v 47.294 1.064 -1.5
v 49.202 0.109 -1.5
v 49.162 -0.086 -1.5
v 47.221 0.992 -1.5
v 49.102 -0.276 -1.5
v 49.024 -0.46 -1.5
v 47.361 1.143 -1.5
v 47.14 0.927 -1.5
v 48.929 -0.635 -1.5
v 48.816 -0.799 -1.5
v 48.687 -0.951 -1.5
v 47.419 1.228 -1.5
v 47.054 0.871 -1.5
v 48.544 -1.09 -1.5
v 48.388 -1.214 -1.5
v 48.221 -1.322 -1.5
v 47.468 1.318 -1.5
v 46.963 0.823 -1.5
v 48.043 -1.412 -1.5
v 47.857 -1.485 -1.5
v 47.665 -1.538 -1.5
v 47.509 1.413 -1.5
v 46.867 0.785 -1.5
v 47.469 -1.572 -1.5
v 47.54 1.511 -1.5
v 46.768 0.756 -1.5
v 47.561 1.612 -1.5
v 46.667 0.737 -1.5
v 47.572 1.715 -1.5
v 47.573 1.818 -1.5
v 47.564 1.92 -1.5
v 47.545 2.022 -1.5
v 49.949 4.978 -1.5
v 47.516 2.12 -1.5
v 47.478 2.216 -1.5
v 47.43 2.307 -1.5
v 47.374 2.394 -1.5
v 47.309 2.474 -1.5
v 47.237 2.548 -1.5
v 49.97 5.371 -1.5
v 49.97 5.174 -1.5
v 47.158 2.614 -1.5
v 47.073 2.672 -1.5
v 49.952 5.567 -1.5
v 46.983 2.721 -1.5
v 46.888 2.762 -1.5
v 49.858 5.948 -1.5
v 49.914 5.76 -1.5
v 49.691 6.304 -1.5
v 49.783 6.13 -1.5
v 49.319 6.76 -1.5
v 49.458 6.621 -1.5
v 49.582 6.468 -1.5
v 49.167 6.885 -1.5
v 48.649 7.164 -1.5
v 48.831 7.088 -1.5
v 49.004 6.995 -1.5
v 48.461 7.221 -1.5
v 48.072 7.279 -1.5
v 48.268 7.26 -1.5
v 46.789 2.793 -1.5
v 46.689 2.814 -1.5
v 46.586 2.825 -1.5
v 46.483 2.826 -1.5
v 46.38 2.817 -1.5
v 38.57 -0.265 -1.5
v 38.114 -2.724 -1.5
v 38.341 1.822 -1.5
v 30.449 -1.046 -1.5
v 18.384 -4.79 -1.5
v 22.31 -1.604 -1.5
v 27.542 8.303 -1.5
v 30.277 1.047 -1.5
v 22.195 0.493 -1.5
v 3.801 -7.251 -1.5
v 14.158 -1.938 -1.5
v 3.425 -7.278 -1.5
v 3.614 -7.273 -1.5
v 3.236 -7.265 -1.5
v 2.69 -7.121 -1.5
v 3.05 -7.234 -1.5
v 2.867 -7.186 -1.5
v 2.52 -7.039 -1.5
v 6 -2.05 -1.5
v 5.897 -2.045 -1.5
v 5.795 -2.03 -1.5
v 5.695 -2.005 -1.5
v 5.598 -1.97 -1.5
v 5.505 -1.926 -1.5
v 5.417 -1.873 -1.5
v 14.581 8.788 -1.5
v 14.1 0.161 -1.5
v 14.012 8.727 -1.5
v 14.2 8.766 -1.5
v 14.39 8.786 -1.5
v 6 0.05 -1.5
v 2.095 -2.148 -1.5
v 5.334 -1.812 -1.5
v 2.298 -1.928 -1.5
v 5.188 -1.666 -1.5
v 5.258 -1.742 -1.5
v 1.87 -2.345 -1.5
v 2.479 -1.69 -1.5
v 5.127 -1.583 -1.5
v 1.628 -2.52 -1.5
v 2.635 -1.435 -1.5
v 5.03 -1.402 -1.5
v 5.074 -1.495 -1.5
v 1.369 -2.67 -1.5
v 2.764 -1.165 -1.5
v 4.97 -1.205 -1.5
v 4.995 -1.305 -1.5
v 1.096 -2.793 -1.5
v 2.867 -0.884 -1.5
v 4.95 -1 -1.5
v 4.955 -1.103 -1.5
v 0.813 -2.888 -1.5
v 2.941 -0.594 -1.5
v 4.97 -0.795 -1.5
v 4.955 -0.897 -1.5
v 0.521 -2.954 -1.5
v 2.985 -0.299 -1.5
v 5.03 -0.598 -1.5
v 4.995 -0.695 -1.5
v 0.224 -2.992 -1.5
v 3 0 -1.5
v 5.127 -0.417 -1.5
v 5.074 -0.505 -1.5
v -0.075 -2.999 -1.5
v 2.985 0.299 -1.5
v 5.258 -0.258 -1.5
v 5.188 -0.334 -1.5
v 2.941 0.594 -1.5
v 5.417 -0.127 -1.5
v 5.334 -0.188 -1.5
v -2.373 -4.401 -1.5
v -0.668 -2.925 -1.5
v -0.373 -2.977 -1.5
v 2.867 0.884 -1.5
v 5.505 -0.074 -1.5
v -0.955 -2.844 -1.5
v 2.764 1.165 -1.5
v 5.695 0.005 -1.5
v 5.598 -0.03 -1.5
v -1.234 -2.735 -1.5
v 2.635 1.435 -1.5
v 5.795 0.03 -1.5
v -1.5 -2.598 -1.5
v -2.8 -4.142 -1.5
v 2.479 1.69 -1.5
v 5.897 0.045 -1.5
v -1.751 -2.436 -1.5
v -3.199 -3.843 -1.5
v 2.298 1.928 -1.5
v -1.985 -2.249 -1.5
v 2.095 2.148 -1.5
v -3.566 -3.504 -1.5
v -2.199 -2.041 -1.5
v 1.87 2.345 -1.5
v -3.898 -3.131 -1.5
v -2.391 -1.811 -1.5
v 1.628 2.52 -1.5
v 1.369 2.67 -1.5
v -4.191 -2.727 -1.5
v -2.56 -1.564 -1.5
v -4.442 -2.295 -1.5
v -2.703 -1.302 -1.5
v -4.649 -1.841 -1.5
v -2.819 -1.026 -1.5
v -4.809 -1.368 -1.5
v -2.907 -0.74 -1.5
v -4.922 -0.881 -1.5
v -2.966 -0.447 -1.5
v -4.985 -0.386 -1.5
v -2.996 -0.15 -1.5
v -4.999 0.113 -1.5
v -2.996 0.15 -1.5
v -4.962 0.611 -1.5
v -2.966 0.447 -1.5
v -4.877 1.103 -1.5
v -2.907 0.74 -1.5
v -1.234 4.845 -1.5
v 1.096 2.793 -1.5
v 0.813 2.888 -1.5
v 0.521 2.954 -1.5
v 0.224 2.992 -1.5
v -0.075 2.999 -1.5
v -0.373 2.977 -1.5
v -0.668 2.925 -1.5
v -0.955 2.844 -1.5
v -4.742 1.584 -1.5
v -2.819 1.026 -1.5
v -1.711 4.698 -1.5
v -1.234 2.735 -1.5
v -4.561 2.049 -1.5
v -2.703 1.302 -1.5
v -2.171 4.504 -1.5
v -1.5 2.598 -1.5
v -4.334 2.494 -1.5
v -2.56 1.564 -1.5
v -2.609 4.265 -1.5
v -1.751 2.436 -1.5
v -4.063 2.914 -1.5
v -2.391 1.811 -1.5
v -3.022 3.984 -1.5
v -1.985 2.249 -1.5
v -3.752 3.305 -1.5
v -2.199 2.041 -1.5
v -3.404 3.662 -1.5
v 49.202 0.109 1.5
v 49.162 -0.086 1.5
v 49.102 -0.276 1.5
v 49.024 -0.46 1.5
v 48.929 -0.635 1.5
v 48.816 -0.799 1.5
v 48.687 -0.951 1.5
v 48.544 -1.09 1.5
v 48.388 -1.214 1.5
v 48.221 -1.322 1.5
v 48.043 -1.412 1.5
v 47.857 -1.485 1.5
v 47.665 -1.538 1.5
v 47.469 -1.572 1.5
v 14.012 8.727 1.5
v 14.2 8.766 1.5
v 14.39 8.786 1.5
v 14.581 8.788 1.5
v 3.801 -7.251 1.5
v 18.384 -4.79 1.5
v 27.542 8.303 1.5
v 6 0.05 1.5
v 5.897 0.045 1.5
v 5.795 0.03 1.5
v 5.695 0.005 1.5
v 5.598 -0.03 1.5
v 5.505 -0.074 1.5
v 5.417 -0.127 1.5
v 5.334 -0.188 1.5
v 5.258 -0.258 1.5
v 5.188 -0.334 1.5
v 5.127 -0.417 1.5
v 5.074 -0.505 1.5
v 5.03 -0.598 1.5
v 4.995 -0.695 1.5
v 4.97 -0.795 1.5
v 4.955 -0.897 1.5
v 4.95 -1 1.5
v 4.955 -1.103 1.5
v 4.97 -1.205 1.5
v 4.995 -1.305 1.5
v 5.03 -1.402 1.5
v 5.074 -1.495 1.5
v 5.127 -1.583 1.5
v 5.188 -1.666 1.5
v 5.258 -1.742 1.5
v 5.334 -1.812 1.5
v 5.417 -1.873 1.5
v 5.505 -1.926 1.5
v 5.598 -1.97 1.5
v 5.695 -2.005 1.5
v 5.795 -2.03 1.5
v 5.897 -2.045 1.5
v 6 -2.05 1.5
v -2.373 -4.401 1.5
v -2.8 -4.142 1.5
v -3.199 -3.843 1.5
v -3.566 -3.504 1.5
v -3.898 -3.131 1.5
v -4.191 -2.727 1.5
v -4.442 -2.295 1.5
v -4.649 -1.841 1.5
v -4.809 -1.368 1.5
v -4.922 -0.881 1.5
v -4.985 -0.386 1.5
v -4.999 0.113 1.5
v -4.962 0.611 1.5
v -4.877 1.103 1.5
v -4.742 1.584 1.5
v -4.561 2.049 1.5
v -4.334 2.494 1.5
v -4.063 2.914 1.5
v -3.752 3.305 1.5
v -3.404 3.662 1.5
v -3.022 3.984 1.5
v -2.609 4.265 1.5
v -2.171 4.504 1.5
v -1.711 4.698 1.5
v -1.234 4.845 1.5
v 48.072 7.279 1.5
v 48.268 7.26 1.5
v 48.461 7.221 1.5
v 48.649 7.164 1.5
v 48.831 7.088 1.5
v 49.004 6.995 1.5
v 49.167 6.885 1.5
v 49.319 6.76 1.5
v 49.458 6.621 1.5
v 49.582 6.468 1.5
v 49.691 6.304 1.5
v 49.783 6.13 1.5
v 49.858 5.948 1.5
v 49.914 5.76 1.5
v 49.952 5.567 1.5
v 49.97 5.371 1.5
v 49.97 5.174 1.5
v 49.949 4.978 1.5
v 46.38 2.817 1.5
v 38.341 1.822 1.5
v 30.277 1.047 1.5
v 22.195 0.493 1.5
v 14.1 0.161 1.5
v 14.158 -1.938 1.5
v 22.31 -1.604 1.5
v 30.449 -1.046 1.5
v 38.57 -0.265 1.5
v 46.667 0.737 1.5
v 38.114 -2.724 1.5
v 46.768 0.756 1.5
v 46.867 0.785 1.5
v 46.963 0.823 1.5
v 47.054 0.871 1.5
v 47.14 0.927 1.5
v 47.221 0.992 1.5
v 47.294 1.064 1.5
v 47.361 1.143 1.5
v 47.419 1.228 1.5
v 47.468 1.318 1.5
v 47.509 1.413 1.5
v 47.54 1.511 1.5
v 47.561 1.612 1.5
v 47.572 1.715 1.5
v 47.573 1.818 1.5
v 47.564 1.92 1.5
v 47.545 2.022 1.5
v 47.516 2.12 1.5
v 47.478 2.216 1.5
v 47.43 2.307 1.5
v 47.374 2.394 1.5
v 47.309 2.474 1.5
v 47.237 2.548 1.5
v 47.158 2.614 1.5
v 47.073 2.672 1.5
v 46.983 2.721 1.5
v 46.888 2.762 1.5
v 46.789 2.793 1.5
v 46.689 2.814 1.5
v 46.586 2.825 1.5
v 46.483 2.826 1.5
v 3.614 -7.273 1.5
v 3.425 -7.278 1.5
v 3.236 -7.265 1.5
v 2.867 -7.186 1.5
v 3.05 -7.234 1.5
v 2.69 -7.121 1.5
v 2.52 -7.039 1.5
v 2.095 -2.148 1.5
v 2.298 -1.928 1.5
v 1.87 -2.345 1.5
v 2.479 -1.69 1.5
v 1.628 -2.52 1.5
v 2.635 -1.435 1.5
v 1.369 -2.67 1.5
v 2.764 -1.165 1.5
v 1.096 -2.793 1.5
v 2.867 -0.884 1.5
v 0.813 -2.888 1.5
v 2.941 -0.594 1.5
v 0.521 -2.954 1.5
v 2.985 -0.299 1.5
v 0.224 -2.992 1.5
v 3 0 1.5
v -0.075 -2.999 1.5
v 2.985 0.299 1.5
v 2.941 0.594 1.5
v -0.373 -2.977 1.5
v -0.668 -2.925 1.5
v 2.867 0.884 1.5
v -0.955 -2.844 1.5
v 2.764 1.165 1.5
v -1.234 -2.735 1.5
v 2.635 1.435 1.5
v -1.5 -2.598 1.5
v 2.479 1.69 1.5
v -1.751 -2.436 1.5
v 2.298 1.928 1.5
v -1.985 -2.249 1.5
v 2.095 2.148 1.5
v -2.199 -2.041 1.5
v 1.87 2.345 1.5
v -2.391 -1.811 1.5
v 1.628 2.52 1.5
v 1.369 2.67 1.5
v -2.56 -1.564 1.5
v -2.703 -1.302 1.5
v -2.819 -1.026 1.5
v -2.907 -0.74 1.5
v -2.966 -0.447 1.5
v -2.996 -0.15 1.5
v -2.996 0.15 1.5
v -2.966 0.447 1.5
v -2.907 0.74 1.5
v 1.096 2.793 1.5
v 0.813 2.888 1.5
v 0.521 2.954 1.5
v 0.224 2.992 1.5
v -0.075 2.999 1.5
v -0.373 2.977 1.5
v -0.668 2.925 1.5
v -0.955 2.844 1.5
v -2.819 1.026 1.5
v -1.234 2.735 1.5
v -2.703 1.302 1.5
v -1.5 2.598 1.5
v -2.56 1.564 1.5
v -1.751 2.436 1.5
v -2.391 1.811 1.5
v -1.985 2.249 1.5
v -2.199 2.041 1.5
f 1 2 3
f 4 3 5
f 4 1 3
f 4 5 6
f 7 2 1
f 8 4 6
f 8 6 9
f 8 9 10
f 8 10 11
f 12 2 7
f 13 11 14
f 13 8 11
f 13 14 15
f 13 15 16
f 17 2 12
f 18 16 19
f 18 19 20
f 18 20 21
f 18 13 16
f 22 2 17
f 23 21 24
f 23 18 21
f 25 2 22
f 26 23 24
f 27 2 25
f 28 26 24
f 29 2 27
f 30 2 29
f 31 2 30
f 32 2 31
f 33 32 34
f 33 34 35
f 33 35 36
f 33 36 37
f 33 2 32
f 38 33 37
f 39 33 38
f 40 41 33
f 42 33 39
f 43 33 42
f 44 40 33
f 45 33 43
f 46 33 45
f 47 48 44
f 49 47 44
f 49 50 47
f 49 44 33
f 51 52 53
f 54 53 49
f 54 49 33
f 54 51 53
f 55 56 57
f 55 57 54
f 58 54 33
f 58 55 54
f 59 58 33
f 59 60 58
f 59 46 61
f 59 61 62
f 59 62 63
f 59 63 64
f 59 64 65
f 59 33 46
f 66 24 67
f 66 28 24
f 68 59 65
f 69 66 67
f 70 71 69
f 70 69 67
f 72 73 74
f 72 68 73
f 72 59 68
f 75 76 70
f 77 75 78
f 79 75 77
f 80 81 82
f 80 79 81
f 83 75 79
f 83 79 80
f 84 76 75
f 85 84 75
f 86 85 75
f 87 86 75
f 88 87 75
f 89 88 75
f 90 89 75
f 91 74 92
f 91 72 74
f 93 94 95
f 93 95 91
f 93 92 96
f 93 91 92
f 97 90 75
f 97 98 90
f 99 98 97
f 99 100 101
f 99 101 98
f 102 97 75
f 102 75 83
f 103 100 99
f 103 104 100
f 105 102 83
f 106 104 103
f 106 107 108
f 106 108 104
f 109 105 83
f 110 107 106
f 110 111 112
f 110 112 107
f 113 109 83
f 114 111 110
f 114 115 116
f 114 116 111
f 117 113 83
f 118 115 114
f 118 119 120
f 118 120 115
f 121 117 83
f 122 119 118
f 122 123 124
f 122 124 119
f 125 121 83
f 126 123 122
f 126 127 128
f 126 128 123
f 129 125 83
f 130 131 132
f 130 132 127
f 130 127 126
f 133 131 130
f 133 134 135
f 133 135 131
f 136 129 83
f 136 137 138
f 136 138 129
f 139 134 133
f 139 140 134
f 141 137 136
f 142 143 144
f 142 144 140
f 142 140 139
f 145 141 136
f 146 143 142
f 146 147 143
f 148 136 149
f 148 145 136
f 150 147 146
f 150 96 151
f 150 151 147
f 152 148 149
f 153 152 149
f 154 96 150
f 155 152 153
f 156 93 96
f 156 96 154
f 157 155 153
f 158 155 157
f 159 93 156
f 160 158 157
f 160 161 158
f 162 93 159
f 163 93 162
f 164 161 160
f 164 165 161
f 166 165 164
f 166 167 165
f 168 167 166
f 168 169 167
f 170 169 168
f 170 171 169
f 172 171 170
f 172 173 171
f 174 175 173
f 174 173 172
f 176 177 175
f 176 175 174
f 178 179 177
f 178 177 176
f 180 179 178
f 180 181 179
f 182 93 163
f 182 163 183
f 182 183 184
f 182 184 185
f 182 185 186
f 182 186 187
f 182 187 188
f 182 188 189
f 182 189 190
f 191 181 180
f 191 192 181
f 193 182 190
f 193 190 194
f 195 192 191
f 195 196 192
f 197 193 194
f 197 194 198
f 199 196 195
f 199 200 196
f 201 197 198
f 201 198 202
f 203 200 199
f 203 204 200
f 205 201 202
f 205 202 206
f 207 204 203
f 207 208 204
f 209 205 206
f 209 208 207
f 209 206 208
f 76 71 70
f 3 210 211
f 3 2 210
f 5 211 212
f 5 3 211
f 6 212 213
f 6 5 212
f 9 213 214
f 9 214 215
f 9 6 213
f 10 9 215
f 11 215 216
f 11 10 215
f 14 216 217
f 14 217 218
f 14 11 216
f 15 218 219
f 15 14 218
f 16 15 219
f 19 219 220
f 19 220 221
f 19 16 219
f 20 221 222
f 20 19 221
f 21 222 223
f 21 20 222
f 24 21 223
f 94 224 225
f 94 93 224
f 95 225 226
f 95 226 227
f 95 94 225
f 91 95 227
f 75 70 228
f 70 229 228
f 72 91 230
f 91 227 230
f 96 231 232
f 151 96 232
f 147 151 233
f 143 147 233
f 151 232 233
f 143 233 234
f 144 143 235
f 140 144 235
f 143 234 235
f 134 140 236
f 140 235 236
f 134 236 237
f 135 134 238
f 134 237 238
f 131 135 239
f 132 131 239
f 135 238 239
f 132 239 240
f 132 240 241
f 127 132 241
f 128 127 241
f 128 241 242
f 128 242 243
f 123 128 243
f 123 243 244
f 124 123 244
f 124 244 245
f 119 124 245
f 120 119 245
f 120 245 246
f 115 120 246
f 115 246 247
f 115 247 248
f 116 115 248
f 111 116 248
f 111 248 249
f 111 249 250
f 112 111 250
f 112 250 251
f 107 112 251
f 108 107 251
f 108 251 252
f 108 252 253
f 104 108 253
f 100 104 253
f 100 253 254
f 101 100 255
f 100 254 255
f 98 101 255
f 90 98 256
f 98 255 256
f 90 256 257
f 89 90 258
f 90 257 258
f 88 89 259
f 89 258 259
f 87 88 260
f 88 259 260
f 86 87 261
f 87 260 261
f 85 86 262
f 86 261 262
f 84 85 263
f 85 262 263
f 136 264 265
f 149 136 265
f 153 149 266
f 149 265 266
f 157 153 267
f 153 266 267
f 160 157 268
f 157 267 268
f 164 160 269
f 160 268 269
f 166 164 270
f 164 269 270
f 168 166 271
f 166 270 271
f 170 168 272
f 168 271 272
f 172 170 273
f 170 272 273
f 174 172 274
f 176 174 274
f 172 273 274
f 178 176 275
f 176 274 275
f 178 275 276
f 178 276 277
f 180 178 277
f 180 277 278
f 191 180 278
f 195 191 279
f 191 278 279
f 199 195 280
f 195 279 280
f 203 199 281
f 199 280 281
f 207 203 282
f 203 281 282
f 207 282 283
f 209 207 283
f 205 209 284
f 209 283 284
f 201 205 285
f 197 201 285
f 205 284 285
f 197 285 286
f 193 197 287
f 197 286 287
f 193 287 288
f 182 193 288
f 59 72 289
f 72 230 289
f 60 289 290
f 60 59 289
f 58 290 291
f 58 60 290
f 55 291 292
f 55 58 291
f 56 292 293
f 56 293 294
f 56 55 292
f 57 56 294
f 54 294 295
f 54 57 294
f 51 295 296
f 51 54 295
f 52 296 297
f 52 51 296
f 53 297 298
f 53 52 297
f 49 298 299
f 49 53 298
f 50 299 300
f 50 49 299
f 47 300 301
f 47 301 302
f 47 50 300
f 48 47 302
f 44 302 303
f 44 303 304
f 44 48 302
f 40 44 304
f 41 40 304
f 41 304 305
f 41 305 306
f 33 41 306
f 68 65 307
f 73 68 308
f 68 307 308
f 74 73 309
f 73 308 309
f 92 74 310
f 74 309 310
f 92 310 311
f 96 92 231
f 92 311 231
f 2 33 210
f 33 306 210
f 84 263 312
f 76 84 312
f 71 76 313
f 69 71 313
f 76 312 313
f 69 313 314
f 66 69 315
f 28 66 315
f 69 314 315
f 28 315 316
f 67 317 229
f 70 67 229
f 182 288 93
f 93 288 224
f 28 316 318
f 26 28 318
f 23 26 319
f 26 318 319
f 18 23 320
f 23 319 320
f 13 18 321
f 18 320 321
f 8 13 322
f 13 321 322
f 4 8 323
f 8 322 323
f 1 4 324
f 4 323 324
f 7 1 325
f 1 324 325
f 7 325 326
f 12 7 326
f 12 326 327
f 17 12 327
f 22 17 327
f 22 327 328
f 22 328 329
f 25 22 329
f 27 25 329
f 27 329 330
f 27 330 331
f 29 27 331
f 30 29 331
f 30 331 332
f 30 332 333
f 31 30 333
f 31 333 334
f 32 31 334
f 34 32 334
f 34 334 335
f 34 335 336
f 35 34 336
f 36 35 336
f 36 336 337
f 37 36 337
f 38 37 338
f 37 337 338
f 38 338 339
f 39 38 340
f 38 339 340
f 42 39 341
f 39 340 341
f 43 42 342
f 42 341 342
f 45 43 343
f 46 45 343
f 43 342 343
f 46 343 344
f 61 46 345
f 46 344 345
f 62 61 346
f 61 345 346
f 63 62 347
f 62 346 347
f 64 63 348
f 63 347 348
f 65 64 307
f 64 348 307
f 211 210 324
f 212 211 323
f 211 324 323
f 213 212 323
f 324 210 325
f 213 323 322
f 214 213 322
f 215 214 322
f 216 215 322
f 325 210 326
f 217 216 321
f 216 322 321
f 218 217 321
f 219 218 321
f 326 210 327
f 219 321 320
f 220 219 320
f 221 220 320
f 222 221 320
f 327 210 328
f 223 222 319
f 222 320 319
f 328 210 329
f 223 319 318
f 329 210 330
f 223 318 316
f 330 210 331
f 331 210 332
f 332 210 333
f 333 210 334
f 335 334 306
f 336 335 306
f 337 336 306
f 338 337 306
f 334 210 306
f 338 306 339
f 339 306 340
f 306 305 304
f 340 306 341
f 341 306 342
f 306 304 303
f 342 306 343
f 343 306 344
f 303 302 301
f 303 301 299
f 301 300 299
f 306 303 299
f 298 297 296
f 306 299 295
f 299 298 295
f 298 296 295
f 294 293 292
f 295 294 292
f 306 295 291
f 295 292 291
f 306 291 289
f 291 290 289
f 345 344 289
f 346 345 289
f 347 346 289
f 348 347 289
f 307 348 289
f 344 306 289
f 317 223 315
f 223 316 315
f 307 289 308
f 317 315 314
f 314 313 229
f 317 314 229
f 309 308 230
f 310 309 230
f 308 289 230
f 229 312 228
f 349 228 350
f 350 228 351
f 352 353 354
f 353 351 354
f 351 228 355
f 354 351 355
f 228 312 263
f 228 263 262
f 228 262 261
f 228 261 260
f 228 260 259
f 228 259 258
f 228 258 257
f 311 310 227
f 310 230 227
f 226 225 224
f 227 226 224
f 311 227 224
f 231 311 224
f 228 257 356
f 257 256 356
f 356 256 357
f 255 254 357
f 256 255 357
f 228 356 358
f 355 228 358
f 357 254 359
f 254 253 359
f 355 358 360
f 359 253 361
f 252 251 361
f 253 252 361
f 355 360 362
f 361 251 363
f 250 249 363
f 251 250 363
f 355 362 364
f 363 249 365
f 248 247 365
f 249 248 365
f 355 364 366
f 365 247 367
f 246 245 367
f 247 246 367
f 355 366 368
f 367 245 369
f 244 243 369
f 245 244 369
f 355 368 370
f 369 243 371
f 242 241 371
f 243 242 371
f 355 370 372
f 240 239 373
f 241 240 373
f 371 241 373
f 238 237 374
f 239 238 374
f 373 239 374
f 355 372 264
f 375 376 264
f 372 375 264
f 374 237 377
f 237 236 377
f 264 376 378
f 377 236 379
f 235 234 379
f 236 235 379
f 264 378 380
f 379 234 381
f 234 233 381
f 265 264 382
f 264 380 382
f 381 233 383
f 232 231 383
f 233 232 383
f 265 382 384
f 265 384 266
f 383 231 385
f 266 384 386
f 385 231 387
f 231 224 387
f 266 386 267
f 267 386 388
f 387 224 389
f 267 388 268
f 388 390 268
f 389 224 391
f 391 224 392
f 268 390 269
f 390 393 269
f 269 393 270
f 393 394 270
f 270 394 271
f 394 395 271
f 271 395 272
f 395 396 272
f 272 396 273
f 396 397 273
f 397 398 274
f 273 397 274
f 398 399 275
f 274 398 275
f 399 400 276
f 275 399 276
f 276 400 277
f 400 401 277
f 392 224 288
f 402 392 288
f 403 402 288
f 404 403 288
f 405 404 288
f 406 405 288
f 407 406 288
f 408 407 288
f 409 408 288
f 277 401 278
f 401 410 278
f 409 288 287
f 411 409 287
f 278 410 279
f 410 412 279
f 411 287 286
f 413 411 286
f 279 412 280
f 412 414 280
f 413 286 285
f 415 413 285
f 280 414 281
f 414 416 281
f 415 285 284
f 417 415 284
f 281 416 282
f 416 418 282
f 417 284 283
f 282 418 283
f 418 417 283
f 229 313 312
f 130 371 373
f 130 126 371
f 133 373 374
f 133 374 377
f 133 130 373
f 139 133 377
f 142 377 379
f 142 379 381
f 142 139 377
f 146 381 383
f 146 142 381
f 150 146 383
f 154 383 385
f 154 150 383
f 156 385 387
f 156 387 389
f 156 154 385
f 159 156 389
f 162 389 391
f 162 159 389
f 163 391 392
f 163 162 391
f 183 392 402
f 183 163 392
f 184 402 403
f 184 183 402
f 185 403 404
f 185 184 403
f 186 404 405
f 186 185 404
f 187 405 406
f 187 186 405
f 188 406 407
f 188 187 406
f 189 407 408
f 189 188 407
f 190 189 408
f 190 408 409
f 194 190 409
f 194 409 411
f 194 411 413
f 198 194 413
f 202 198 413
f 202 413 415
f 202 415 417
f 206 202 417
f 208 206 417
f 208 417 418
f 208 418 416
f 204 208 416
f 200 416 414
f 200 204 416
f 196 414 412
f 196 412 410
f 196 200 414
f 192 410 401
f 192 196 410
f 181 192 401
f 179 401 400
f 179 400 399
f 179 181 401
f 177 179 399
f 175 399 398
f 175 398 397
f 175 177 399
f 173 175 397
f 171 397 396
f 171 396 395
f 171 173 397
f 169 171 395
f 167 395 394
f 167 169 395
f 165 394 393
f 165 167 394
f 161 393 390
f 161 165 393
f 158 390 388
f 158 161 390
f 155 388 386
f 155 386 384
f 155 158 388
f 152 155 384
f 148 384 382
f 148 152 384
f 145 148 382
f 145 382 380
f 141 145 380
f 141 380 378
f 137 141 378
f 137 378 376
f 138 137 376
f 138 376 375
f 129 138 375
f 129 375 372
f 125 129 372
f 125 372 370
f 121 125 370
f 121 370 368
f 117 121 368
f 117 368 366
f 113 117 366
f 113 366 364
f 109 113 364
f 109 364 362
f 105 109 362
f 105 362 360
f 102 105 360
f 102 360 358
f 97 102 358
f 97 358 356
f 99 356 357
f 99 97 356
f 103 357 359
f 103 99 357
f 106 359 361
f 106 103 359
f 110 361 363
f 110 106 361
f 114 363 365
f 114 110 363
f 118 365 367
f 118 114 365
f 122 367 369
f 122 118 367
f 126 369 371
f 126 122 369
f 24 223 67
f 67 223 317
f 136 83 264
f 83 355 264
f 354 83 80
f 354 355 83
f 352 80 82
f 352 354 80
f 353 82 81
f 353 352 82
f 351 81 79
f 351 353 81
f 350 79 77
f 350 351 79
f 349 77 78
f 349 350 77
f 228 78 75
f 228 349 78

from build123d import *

# Parameters (mm, degrees)
SKETCH_1_R          = 3
EXTRUDE_1_DEPTH     = 1.5
CUT_EXTRUDE_1_DEPTH = 22
FILLET_1_R          = 2


with BuildPart() as part:
    # 草图1 → 凸台-拉伸1 (new, symmetric)
    with BuildSketch(Plane.XY):
        with BuildLine():
            Line((-1.233702436, 4.84540796), (14.292269552, 8.798517714))
            Line((14.292269552, 8.798517714), (27.541816671, 8.302545362))
            Line((27.541816671, 8.302545362), (50.285691672, 7.168894271))
            Line((50.285691672, 7.168894271), (48.971743891, -1.387225717))
            Line((48.971743891, -1.387225717), (38.114277377, -2.724152564))
            Line((38.114277377, -2.724152564), (18.384478153, -4.790312237))
            Line((18.384478153, -4.790312237), (3.124153733, -7.364758207))
            Line((3.124153733, -7.364758207), (-2.372822781, -4.401103504))
            ThreePointArc((-2.372822781, -4.401103504), (-4.962484216, 0.611351292), (-1.233702436, 4.84540796))
        make_face()
        Circle(SKETCH_1_R, mode=Mode.SUBTRACT)
    extrude(amount=EXTRUDE_1_DEPTH, both=True)

    # 草图2 → 切除-拉伸1 (cut)
    with BuildSketch(Plane.XY.offset(1.5)):
        with BuildLine():
            ThreePointArc((6, -2.05), (26.381158068, -1.352479883), (46.666940766, 0.736816365))
            ThreePointArc((46.666940766, 0.736816365), (47.563889378, 1.920236488), (46.380469254, 2.8171851))
            ThreePointArc((46.380469254, 2.8171851), (26.237586384, 0.742606553), (6, 0.05))
            ThreePointArc((6, 0.05), (4.95, -1), (6, -2.05))
        make_face()
    extrude(amount=-CUT_EXTRUDE_1_DEPTH, mode=Mode.SUBTRACT)

    # 圆角1
    fillet_1_edges = [part.edges().sort_by_distance(p)[0] for p in [
        (14.292269552, 8.798517714, 0),
        (27.541816671, 8.302545362, 0),
        (50.285691672, 7.168894271, 0),
        (48.971743891, -1.387225717, 0),
        (38.114277377, -2.724152564, 0),
        (18.384478153, -4.790312237, 0),
        (3.124153733, -7.364758207, 0),
    ]]
    fillet(fillet_1_edges, radius=FILLET_1_R)


solid = part.part
